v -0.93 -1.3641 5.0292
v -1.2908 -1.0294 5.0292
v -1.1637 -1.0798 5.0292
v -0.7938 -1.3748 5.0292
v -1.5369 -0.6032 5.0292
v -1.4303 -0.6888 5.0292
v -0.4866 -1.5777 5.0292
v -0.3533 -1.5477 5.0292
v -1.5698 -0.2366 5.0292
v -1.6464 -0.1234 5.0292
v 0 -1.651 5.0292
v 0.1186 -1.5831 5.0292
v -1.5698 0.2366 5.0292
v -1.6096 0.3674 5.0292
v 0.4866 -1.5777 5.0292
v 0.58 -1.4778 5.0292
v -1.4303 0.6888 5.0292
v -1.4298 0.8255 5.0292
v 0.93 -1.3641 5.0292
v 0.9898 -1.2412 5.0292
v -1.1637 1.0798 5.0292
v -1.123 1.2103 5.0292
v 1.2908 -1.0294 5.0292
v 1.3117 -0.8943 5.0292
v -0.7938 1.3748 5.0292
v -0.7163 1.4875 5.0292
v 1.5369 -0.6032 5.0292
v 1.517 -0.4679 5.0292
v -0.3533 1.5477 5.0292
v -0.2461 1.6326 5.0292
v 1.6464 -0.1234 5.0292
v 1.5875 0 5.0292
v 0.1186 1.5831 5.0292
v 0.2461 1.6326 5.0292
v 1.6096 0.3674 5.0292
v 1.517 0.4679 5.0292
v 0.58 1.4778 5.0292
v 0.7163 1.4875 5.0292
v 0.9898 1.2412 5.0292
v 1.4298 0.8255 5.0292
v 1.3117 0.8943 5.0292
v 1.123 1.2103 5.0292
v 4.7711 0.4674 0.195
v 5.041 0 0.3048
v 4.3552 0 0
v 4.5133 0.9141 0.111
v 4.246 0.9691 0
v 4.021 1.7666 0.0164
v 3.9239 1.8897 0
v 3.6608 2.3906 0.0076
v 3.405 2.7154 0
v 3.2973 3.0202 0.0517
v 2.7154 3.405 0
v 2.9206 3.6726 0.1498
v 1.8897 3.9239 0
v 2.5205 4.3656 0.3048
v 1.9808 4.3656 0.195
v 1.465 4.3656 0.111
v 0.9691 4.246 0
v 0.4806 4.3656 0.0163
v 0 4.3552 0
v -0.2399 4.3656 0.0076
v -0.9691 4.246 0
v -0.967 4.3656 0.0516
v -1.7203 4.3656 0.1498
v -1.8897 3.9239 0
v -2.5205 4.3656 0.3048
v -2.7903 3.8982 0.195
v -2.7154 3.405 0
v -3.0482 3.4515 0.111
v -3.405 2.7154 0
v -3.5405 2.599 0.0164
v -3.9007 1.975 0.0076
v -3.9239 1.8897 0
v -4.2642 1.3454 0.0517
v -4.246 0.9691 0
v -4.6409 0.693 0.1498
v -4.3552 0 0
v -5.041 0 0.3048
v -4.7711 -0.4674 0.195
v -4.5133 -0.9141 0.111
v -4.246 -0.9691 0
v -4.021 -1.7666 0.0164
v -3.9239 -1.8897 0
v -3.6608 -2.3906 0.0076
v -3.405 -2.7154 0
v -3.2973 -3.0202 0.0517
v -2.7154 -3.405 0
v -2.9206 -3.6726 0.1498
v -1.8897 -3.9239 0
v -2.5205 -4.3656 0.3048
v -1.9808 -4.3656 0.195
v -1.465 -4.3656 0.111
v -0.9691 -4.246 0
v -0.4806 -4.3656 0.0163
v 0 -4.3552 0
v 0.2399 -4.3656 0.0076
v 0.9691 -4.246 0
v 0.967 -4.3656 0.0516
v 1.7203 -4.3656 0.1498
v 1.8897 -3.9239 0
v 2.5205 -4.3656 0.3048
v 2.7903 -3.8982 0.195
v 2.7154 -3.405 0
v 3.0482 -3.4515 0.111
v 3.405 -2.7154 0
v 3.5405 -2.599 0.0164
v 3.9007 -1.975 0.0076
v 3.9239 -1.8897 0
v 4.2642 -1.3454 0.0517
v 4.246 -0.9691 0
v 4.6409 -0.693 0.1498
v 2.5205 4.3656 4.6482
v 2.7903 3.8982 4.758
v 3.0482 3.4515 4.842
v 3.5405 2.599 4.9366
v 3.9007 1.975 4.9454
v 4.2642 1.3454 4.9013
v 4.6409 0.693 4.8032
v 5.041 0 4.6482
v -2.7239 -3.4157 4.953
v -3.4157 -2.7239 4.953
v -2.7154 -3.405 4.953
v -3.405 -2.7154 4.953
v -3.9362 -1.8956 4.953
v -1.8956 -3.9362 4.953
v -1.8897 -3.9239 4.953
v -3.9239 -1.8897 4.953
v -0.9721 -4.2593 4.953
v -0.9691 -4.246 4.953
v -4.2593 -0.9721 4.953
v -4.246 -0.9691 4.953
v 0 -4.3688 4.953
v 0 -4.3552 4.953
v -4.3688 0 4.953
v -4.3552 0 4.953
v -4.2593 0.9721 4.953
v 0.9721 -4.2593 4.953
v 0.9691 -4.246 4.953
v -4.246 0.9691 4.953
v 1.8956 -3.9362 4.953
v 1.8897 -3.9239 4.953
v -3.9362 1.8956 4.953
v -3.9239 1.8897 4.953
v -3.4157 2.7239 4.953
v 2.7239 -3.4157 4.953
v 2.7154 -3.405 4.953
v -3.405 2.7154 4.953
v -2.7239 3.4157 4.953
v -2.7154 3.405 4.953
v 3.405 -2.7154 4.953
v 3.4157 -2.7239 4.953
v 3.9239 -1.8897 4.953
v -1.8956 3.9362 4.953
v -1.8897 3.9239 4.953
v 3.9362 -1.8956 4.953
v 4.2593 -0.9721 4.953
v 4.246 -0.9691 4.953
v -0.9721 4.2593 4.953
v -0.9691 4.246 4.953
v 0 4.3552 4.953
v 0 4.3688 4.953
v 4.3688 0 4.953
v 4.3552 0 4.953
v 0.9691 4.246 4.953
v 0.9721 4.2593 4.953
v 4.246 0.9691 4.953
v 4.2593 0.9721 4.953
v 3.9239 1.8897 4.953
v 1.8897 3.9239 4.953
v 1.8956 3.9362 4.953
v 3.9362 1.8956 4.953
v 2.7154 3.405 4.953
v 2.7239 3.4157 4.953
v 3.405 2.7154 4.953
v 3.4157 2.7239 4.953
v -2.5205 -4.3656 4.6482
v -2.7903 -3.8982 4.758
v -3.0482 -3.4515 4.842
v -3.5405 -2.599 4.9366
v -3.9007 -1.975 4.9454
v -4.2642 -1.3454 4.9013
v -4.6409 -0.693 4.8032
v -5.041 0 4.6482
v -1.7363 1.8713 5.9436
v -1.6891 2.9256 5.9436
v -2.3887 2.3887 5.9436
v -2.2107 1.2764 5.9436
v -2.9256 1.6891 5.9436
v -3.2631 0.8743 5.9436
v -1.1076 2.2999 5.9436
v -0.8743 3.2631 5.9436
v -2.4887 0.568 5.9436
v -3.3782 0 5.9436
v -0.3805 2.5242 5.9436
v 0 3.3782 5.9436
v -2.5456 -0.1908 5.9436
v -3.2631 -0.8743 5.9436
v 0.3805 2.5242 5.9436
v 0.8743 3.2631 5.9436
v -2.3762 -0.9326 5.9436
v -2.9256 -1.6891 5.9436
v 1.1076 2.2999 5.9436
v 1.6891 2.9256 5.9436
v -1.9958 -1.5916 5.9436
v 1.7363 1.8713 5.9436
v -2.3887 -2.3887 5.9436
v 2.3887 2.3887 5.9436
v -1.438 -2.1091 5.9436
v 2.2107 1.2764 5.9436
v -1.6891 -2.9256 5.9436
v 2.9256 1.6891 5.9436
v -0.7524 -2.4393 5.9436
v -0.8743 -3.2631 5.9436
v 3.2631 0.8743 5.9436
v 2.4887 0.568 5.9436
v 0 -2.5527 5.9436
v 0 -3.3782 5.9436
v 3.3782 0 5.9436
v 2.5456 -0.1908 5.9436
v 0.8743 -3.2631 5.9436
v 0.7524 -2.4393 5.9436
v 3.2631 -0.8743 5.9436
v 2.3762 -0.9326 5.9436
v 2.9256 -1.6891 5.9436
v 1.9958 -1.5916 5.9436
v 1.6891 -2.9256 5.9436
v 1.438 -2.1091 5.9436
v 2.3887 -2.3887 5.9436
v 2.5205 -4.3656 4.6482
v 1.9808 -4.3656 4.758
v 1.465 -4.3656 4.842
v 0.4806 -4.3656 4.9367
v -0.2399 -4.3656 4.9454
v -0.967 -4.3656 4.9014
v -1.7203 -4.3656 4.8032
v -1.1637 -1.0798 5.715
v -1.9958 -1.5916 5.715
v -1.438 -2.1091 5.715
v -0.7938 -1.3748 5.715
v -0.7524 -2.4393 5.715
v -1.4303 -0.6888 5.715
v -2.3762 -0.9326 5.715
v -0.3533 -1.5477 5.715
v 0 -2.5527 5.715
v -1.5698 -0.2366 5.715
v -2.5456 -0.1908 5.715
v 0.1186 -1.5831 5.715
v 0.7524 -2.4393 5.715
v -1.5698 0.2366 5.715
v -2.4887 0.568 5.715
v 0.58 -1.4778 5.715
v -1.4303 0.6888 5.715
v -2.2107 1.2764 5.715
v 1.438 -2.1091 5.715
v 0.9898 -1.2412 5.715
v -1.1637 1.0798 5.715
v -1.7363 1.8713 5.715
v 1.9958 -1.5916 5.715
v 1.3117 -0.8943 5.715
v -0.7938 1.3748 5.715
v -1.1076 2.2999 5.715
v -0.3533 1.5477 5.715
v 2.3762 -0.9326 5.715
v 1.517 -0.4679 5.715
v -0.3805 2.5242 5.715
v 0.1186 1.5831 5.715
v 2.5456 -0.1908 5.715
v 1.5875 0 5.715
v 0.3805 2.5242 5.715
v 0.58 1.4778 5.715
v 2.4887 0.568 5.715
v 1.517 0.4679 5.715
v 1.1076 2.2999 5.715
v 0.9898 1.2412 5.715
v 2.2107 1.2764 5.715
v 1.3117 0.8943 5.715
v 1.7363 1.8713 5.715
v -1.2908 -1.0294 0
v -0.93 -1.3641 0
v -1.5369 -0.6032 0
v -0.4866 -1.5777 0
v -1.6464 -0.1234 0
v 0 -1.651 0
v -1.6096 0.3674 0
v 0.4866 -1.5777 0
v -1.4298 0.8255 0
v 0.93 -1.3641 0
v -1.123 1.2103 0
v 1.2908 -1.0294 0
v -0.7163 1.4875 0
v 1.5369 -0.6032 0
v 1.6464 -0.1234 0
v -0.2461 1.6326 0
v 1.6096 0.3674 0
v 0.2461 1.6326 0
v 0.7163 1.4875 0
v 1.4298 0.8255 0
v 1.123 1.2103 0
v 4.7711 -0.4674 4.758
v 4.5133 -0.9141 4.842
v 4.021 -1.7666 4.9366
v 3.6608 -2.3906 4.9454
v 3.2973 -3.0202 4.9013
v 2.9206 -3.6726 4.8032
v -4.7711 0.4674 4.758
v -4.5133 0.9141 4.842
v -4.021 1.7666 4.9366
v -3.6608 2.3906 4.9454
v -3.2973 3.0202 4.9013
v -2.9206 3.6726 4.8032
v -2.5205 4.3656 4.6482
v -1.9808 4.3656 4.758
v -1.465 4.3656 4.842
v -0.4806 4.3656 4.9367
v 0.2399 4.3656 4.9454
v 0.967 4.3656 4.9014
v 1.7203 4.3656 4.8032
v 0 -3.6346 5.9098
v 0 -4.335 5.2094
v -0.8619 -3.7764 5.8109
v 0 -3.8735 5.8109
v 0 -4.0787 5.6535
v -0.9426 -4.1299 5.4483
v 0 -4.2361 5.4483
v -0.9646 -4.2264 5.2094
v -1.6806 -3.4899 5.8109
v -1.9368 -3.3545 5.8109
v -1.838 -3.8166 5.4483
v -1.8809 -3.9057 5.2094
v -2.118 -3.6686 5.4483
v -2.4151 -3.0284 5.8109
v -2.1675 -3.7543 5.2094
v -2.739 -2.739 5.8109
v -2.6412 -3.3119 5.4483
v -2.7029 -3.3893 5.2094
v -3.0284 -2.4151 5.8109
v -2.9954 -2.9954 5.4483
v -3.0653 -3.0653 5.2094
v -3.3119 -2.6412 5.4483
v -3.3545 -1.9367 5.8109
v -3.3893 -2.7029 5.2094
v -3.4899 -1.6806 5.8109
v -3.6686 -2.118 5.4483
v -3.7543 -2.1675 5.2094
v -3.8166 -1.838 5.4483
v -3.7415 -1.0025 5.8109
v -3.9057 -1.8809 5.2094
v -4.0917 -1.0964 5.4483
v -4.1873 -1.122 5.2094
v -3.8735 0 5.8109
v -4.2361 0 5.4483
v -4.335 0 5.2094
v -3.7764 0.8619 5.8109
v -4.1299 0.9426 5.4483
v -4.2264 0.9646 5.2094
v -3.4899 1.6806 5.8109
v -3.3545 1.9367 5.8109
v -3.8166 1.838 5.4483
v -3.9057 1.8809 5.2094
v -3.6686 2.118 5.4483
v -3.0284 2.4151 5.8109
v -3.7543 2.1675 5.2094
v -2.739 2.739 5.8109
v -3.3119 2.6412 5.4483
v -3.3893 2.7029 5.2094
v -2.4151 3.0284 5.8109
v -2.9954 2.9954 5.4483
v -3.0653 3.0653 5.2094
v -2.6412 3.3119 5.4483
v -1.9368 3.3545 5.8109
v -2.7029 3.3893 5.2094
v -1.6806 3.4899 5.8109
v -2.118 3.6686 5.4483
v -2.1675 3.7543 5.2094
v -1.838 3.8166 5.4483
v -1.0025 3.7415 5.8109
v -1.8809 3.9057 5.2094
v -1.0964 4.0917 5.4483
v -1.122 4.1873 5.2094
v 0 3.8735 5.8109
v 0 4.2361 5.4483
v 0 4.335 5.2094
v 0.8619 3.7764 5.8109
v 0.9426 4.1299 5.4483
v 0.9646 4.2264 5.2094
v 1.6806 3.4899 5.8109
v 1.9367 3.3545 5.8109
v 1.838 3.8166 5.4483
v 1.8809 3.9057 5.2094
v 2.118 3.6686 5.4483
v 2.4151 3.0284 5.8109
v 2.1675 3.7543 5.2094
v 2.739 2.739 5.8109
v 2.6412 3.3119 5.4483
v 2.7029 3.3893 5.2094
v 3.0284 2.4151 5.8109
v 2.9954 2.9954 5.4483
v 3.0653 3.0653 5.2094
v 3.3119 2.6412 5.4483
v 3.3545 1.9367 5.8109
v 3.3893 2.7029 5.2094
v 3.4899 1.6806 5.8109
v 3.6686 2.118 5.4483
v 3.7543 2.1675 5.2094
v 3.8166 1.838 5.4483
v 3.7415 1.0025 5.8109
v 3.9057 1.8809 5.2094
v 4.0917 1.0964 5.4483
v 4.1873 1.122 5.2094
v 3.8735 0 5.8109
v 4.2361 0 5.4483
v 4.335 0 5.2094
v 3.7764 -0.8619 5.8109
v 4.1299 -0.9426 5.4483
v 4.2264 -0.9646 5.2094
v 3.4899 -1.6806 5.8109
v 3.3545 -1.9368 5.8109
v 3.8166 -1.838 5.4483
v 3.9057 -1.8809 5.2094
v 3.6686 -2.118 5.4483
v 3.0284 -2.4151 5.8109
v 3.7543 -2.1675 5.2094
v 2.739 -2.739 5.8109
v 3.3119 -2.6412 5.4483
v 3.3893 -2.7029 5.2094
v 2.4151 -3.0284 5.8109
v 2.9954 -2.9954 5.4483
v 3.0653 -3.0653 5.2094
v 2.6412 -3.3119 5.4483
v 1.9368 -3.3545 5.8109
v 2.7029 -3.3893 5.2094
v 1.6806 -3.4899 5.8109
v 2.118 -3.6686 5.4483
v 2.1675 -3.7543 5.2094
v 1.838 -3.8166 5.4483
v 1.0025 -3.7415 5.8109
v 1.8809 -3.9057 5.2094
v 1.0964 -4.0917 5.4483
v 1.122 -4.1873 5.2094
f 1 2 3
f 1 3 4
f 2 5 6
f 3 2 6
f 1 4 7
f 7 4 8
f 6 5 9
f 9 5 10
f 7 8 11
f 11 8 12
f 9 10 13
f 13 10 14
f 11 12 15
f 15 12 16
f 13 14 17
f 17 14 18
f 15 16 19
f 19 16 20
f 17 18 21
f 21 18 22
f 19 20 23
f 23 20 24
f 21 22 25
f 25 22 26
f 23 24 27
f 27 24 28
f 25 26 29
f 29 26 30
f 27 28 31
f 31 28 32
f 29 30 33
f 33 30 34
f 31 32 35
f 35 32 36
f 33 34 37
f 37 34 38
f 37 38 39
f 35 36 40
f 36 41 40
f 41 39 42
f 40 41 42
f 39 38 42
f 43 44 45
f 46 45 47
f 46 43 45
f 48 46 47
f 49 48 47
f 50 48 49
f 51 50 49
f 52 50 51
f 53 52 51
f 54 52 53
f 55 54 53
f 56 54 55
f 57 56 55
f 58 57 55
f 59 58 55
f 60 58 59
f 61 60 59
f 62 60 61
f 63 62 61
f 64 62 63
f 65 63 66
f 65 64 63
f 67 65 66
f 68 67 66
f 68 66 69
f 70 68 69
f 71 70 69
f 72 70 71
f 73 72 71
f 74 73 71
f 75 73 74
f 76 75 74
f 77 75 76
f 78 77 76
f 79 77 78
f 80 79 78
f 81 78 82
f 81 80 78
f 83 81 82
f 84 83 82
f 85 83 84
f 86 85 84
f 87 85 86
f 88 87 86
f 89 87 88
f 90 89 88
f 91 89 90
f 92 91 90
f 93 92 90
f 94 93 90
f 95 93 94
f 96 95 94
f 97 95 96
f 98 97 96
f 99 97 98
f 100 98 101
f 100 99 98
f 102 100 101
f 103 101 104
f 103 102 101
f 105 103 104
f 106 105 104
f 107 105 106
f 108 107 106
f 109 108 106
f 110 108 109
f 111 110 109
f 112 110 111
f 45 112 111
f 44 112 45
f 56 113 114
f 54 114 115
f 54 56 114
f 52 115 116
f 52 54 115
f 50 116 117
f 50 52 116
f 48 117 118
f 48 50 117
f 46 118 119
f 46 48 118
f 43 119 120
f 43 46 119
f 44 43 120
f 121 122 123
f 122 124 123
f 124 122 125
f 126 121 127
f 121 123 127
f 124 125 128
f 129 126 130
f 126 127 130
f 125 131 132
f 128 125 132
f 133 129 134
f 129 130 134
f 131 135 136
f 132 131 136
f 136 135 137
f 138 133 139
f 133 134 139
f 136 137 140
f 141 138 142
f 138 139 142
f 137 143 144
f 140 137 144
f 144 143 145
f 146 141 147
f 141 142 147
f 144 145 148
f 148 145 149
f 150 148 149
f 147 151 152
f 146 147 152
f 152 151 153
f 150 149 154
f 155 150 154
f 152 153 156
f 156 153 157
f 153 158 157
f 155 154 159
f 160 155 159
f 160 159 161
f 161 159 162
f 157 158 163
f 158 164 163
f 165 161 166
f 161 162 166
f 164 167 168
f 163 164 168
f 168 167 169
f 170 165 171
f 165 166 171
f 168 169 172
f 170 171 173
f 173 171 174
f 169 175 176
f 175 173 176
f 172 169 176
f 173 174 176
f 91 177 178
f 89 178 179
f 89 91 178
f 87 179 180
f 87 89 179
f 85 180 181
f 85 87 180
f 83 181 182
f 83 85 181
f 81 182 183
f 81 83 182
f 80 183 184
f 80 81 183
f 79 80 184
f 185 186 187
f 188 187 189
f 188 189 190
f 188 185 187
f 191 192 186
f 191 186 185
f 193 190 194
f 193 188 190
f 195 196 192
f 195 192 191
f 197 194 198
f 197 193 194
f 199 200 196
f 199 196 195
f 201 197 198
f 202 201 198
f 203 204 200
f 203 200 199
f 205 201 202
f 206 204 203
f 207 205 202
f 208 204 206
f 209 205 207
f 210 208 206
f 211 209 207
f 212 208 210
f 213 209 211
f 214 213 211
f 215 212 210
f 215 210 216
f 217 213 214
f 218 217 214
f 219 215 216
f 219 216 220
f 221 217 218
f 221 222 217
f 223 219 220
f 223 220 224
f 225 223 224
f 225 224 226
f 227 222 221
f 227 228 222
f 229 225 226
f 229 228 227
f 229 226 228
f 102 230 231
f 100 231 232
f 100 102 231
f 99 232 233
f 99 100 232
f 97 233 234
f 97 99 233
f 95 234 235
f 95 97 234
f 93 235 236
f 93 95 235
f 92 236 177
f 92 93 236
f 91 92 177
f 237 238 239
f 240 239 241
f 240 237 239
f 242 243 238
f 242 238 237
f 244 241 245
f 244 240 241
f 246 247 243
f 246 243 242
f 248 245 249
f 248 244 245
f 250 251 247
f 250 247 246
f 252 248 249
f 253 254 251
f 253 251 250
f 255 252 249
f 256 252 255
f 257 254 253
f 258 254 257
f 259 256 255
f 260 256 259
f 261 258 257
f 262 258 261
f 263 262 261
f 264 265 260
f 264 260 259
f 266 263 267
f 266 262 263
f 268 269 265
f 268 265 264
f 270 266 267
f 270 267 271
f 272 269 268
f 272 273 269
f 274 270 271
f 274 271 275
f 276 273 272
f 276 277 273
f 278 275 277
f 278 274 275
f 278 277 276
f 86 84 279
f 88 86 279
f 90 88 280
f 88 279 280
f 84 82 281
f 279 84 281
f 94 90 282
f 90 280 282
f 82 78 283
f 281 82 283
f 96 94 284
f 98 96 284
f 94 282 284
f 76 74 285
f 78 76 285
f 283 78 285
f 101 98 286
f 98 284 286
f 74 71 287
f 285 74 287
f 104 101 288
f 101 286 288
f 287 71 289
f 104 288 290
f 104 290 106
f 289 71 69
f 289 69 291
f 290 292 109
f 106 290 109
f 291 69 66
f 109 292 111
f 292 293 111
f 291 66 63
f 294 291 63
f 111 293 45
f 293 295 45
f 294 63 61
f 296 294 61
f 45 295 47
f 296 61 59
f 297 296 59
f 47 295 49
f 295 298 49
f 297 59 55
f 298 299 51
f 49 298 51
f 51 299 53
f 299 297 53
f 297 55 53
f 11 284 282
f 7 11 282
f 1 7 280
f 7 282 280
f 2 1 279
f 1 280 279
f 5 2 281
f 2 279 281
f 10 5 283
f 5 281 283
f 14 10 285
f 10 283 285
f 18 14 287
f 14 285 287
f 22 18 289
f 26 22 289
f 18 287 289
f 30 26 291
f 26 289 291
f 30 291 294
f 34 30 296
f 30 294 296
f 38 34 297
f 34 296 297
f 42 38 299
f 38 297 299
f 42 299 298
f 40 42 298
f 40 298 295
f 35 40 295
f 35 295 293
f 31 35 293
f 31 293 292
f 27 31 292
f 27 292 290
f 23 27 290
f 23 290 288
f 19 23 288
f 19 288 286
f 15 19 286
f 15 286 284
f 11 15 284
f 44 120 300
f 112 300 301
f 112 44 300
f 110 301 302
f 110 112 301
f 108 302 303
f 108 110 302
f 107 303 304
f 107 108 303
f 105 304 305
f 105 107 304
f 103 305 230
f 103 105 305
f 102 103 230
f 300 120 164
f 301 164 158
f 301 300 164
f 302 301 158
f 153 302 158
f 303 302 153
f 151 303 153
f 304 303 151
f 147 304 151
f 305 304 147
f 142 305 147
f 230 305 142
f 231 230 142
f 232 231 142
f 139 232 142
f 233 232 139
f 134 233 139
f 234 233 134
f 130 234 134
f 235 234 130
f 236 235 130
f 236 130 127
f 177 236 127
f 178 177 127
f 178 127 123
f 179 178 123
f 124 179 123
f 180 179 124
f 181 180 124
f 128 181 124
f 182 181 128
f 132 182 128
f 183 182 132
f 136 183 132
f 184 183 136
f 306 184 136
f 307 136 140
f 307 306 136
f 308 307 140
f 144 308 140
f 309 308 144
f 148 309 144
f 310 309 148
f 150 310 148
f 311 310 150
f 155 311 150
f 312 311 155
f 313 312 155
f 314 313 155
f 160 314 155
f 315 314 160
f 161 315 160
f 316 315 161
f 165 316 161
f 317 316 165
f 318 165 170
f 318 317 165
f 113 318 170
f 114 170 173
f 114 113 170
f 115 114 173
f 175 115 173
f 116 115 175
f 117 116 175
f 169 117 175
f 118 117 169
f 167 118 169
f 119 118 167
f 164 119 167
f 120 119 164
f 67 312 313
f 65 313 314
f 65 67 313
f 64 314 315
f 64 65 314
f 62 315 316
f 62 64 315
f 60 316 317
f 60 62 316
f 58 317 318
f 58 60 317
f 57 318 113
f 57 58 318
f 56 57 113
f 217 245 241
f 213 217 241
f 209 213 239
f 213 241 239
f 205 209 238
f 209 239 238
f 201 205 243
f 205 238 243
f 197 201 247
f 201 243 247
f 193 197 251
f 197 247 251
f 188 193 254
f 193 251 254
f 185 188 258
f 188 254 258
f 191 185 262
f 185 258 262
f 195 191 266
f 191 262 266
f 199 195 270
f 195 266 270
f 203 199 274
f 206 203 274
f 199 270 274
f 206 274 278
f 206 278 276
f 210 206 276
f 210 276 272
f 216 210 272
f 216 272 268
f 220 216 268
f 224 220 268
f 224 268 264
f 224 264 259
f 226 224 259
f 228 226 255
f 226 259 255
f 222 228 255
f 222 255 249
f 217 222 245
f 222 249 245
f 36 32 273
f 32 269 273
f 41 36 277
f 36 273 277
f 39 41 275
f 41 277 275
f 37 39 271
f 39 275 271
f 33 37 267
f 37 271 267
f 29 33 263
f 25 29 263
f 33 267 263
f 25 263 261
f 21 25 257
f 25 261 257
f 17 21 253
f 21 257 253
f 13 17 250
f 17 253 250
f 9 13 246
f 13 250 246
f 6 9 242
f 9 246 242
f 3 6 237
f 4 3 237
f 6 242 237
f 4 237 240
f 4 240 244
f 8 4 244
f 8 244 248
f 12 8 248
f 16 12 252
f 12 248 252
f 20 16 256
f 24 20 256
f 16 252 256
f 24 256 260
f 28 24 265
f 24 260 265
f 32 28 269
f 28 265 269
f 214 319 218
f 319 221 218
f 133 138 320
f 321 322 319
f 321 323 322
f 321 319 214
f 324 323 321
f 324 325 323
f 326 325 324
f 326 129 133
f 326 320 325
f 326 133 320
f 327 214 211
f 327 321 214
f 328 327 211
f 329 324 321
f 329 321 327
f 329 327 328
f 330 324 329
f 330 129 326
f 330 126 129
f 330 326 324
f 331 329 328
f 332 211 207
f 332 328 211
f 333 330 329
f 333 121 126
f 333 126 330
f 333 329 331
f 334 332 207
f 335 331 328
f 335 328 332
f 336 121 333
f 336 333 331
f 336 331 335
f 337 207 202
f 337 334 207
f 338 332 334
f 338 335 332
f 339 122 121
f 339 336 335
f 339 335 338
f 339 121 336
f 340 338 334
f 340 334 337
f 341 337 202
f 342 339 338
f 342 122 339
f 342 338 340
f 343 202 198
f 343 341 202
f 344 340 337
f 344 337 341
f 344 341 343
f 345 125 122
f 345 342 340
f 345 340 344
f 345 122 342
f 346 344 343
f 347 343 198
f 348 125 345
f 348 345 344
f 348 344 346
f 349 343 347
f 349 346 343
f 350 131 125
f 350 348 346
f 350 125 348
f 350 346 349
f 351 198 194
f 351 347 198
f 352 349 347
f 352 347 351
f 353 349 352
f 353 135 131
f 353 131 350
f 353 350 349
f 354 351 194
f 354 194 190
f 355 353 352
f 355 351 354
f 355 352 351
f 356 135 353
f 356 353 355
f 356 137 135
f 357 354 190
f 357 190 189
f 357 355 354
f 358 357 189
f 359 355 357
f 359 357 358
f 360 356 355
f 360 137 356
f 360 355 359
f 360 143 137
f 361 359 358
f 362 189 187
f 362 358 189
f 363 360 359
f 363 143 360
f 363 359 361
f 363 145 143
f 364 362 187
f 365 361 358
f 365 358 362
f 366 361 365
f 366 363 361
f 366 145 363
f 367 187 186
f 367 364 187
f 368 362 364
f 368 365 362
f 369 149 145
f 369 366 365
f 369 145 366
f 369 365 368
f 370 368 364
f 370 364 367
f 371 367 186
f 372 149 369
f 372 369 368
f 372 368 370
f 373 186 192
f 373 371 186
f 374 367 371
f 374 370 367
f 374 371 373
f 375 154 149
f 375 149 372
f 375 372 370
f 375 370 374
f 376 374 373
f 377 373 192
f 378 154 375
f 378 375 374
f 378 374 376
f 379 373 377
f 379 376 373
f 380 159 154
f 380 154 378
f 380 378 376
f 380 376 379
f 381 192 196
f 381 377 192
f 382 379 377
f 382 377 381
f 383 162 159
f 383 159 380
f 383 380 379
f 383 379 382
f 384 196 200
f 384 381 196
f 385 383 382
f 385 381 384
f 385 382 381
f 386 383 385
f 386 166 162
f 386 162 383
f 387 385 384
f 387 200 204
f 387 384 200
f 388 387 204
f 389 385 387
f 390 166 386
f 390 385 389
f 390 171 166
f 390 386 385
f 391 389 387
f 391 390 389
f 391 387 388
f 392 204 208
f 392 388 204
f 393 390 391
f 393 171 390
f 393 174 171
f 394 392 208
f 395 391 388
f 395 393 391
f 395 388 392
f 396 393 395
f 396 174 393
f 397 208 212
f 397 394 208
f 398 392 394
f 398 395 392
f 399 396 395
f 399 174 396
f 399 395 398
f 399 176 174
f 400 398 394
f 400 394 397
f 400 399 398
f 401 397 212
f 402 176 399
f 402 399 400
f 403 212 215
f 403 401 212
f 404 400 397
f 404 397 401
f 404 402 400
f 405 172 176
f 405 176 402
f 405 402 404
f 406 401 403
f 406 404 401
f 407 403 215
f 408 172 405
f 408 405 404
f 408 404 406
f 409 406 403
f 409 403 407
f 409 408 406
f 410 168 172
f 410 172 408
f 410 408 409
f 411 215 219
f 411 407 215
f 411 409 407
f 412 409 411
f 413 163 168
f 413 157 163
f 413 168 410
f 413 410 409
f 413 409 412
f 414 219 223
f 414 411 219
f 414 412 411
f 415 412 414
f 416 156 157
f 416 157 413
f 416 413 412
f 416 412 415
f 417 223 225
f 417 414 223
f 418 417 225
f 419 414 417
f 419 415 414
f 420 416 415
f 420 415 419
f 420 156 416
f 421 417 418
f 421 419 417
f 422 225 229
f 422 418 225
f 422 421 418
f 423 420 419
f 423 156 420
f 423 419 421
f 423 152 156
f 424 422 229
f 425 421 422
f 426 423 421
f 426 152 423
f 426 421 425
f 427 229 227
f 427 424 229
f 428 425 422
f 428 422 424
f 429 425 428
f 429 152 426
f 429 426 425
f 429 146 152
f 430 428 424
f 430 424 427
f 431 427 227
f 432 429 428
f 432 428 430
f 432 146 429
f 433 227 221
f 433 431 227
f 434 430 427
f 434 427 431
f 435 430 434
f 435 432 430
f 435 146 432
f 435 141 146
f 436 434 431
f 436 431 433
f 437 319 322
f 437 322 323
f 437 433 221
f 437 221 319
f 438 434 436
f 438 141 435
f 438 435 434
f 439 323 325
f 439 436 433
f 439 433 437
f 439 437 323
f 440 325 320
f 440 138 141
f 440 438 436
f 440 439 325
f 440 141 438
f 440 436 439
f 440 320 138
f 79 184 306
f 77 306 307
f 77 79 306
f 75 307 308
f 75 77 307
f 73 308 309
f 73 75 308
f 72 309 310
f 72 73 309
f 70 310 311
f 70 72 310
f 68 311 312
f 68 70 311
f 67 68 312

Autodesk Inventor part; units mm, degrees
ref_plane "YZ Plane" through (0, 0, 0) normal (1, 0, 0) x (0, 1, 0)
ref_plane "XZ Plane" through (0, 0, 0) normal (0, 1, 0) x (-1, 0, 0)
ref_plane "XY Plane" through (0, 0, 0) normal (0, 0, 1) x (1, 0, 0)
sketch "Sketch1" plane through (0, 0, 0) normal (0, 0, 1) x (1, 0, 0)
  line L0 (-2.5205, 4.3656) -> (2.5205, 4.3656)
  line L1 (2.5205, 4.3656) -> (5.041, 0)
  line L2 (5.041, 0) -> (2.5205, -4.3656)
  line L3 (2.5205, -4.3656) -> (-2.5205, -4.3656)
  line L4 (-2.5205, -4.3656) -> (-5.041, 0)
  line L5 (-5.041, 0) -> (-2.5205, 4.3656)
  point P0 (0, 0)
  point P1 (0, 0)
  dimension "d0" = 8.7312
extrude "Extrusion1" add sketch "Sketch1" along normal blind 4.953
sketch "Sketch2" plane through (0, 0, 0) normal (1, 0, 0) x (0, 1, 0)
  line L0 (4.3656, 4.953) -> (4.3656, 0) construction
  line L1 (4.3656, 0) -> (-4.3656, 0) construction
  line L2 (-4.3656, 0) -> (-4.3656, 4.953) construction
  line L3 (-4.3656, 4.953) -> (4.3656, 4.953) construction
  line L4 (0, 4.953) -> (0, 5.9436)
  line L5 (-4.3656, 4.953) -> (0, 4.953)
  arc A0 (-3.3782, 5.9436) -> (-4.3688, 4.953) centre (-3.3782, 4.953) ccw
  line L6 (-3.3782, 5.9436) -> (0, 5.9436)
  line L7 (0, 5.9436) -> (0, 4.953)
  line L8 (0, 4.953) -> (-4.3688, 4.953)
  point P0 (0, 0)
  dimension "d6" = 0.9906
  dimension "d7" = 3.3782
revolve "Revolution1" add sketch "Sketch2" angle 360 about axis through (0, 0, 4.953) along (0, 0, 1)
sketch "Sketch3" plane through (0, 0, 0) normal (0, 1, 0) x (-1, 0, 0)
  arc A0 (-3.3782, 5.9436) -> (-4.3688, 4.953) centre (-3.3782, 4.953) ccw construction
  line L0 (-3.3782, 5.9436) -> (3.3782, 5.9436) construction
  arc A1 (4.3688, 4.953) -> (3.3782, 5.9436) centre (3.3782, 4.953) ccw construction
  line L1 (4.3688, 4.953) -> (5.041, 4.953) construction
  line L2 (5.041, 4.953) -> (5.041, 0) construction
  line L3 (5.041, 0) -> (-5.041, 0) construction
  line L4 (-5.041, 0) -> (-5.041, 4.953) construction
  line L5 (-5.041, 4.953) -> (-4.3688, 4.953) construction
  line L6 (-4.3552, 4.953) -> (-5.041, 4.6482)
  line L7 (-5.041, 4.6482) -> (-5.041, 4.953)
  line L8 (-5.041, 4.953) -> (-4.3552, 4.953)
  line L9 (0, 0) -> (0, 7.4764) construction
  line L10 (-5.041, 0.3048) -> (-4.3552, 0)
  line L11 (-5.041, 0.3048) -> (-5.041, 0)
  line L12 (-5.041, 0) -> (-4.3552, 0)
  dimension "d9" = 0.6858
  dimension "d10" = 0.3048
  dimension "d11" = 0.3048
  dimension "d12" = 0.6858
revolve "Revolution2" cut sketch "Sketch3" angle 360 about axis through (0, 0, 0) along (0, 0, 1)
sketch "Sketch4" plane through (0, 0, 5.9436) normal (0, 0, 1) x (1, 0, 0)
  circle A0 centre (0, 0) radius 3.3782 projected
hole "Hole1" at (0, 0, 5.9436) direction (0, 0, -1) diameter 3.302 end through all counterbore diameter 5.1054 counterbore depth 0.2286 thread size "8-32 UNC" class "2B" standard "ANSI Unified Screw Threads"
sketch "Sketch5" plane through (0, 0, 5.715) normal (0, 0, 1) x (1, 0, 0)
  circle A0 centre (0, 0) radius 1.651 projected
  circle A1 centre (0, 0) radius 1.5875
  dimension "d21" = 3.175
extrude "Extrusion2" add sketch "Sketch5" against normal blind 0.6858
equation "\"d6\" = d5"
equation "\"d5\" = 0.9906"
properties part number "8-32 locknut" material "Aluminum 6061"
